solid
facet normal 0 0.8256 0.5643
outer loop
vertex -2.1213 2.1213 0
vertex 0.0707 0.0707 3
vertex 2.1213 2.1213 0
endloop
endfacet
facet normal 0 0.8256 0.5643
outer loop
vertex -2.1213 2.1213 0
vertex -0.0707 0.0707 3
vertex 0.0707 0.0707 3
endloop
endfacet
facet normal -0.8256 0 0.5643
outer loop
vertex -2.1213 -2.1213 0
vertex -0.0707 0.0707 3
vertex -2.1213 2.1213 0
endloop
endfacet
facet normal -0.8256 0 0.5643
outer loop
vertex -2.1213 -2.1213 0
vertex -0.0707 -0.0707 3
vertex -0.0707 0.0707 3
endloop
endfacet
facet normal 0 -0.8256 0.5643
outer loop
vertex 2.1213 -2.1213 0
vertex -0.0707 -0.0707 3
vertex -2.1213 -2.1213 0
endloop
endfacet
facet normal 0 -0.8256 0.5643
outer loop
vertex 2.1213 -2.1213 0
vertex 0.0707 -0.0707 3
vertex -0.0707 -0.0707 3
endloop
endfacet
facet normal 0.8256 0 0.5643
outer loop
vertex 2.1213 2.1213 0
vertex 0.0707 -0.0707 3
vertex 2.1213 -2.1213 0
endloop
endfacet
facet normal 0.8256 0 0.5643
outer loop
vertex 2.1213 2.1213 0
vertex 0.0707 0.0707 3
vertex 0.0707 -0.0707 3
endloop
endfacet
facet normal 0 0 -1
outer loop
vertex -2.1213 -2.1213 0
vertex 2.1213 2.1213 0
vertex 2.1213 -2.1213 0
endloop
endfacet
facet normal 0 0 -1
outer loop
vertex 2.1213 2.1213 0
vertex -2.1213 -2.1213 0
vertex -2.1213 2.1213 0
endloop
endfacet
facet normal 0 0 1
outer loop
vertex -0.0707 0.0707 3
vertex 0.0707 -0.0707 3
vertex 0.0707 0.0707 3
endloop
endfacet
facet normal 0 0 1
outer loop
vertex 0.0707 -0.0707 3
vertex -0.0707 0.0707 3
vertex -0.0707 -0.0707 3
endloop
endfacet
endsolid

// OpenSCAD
// fractal1.scad
use <Lsystem.scad>


//========================

rotate([0,0,45])
cylinder(r1=3,r2=0.1,h=3,$fn=4);

//===========================
